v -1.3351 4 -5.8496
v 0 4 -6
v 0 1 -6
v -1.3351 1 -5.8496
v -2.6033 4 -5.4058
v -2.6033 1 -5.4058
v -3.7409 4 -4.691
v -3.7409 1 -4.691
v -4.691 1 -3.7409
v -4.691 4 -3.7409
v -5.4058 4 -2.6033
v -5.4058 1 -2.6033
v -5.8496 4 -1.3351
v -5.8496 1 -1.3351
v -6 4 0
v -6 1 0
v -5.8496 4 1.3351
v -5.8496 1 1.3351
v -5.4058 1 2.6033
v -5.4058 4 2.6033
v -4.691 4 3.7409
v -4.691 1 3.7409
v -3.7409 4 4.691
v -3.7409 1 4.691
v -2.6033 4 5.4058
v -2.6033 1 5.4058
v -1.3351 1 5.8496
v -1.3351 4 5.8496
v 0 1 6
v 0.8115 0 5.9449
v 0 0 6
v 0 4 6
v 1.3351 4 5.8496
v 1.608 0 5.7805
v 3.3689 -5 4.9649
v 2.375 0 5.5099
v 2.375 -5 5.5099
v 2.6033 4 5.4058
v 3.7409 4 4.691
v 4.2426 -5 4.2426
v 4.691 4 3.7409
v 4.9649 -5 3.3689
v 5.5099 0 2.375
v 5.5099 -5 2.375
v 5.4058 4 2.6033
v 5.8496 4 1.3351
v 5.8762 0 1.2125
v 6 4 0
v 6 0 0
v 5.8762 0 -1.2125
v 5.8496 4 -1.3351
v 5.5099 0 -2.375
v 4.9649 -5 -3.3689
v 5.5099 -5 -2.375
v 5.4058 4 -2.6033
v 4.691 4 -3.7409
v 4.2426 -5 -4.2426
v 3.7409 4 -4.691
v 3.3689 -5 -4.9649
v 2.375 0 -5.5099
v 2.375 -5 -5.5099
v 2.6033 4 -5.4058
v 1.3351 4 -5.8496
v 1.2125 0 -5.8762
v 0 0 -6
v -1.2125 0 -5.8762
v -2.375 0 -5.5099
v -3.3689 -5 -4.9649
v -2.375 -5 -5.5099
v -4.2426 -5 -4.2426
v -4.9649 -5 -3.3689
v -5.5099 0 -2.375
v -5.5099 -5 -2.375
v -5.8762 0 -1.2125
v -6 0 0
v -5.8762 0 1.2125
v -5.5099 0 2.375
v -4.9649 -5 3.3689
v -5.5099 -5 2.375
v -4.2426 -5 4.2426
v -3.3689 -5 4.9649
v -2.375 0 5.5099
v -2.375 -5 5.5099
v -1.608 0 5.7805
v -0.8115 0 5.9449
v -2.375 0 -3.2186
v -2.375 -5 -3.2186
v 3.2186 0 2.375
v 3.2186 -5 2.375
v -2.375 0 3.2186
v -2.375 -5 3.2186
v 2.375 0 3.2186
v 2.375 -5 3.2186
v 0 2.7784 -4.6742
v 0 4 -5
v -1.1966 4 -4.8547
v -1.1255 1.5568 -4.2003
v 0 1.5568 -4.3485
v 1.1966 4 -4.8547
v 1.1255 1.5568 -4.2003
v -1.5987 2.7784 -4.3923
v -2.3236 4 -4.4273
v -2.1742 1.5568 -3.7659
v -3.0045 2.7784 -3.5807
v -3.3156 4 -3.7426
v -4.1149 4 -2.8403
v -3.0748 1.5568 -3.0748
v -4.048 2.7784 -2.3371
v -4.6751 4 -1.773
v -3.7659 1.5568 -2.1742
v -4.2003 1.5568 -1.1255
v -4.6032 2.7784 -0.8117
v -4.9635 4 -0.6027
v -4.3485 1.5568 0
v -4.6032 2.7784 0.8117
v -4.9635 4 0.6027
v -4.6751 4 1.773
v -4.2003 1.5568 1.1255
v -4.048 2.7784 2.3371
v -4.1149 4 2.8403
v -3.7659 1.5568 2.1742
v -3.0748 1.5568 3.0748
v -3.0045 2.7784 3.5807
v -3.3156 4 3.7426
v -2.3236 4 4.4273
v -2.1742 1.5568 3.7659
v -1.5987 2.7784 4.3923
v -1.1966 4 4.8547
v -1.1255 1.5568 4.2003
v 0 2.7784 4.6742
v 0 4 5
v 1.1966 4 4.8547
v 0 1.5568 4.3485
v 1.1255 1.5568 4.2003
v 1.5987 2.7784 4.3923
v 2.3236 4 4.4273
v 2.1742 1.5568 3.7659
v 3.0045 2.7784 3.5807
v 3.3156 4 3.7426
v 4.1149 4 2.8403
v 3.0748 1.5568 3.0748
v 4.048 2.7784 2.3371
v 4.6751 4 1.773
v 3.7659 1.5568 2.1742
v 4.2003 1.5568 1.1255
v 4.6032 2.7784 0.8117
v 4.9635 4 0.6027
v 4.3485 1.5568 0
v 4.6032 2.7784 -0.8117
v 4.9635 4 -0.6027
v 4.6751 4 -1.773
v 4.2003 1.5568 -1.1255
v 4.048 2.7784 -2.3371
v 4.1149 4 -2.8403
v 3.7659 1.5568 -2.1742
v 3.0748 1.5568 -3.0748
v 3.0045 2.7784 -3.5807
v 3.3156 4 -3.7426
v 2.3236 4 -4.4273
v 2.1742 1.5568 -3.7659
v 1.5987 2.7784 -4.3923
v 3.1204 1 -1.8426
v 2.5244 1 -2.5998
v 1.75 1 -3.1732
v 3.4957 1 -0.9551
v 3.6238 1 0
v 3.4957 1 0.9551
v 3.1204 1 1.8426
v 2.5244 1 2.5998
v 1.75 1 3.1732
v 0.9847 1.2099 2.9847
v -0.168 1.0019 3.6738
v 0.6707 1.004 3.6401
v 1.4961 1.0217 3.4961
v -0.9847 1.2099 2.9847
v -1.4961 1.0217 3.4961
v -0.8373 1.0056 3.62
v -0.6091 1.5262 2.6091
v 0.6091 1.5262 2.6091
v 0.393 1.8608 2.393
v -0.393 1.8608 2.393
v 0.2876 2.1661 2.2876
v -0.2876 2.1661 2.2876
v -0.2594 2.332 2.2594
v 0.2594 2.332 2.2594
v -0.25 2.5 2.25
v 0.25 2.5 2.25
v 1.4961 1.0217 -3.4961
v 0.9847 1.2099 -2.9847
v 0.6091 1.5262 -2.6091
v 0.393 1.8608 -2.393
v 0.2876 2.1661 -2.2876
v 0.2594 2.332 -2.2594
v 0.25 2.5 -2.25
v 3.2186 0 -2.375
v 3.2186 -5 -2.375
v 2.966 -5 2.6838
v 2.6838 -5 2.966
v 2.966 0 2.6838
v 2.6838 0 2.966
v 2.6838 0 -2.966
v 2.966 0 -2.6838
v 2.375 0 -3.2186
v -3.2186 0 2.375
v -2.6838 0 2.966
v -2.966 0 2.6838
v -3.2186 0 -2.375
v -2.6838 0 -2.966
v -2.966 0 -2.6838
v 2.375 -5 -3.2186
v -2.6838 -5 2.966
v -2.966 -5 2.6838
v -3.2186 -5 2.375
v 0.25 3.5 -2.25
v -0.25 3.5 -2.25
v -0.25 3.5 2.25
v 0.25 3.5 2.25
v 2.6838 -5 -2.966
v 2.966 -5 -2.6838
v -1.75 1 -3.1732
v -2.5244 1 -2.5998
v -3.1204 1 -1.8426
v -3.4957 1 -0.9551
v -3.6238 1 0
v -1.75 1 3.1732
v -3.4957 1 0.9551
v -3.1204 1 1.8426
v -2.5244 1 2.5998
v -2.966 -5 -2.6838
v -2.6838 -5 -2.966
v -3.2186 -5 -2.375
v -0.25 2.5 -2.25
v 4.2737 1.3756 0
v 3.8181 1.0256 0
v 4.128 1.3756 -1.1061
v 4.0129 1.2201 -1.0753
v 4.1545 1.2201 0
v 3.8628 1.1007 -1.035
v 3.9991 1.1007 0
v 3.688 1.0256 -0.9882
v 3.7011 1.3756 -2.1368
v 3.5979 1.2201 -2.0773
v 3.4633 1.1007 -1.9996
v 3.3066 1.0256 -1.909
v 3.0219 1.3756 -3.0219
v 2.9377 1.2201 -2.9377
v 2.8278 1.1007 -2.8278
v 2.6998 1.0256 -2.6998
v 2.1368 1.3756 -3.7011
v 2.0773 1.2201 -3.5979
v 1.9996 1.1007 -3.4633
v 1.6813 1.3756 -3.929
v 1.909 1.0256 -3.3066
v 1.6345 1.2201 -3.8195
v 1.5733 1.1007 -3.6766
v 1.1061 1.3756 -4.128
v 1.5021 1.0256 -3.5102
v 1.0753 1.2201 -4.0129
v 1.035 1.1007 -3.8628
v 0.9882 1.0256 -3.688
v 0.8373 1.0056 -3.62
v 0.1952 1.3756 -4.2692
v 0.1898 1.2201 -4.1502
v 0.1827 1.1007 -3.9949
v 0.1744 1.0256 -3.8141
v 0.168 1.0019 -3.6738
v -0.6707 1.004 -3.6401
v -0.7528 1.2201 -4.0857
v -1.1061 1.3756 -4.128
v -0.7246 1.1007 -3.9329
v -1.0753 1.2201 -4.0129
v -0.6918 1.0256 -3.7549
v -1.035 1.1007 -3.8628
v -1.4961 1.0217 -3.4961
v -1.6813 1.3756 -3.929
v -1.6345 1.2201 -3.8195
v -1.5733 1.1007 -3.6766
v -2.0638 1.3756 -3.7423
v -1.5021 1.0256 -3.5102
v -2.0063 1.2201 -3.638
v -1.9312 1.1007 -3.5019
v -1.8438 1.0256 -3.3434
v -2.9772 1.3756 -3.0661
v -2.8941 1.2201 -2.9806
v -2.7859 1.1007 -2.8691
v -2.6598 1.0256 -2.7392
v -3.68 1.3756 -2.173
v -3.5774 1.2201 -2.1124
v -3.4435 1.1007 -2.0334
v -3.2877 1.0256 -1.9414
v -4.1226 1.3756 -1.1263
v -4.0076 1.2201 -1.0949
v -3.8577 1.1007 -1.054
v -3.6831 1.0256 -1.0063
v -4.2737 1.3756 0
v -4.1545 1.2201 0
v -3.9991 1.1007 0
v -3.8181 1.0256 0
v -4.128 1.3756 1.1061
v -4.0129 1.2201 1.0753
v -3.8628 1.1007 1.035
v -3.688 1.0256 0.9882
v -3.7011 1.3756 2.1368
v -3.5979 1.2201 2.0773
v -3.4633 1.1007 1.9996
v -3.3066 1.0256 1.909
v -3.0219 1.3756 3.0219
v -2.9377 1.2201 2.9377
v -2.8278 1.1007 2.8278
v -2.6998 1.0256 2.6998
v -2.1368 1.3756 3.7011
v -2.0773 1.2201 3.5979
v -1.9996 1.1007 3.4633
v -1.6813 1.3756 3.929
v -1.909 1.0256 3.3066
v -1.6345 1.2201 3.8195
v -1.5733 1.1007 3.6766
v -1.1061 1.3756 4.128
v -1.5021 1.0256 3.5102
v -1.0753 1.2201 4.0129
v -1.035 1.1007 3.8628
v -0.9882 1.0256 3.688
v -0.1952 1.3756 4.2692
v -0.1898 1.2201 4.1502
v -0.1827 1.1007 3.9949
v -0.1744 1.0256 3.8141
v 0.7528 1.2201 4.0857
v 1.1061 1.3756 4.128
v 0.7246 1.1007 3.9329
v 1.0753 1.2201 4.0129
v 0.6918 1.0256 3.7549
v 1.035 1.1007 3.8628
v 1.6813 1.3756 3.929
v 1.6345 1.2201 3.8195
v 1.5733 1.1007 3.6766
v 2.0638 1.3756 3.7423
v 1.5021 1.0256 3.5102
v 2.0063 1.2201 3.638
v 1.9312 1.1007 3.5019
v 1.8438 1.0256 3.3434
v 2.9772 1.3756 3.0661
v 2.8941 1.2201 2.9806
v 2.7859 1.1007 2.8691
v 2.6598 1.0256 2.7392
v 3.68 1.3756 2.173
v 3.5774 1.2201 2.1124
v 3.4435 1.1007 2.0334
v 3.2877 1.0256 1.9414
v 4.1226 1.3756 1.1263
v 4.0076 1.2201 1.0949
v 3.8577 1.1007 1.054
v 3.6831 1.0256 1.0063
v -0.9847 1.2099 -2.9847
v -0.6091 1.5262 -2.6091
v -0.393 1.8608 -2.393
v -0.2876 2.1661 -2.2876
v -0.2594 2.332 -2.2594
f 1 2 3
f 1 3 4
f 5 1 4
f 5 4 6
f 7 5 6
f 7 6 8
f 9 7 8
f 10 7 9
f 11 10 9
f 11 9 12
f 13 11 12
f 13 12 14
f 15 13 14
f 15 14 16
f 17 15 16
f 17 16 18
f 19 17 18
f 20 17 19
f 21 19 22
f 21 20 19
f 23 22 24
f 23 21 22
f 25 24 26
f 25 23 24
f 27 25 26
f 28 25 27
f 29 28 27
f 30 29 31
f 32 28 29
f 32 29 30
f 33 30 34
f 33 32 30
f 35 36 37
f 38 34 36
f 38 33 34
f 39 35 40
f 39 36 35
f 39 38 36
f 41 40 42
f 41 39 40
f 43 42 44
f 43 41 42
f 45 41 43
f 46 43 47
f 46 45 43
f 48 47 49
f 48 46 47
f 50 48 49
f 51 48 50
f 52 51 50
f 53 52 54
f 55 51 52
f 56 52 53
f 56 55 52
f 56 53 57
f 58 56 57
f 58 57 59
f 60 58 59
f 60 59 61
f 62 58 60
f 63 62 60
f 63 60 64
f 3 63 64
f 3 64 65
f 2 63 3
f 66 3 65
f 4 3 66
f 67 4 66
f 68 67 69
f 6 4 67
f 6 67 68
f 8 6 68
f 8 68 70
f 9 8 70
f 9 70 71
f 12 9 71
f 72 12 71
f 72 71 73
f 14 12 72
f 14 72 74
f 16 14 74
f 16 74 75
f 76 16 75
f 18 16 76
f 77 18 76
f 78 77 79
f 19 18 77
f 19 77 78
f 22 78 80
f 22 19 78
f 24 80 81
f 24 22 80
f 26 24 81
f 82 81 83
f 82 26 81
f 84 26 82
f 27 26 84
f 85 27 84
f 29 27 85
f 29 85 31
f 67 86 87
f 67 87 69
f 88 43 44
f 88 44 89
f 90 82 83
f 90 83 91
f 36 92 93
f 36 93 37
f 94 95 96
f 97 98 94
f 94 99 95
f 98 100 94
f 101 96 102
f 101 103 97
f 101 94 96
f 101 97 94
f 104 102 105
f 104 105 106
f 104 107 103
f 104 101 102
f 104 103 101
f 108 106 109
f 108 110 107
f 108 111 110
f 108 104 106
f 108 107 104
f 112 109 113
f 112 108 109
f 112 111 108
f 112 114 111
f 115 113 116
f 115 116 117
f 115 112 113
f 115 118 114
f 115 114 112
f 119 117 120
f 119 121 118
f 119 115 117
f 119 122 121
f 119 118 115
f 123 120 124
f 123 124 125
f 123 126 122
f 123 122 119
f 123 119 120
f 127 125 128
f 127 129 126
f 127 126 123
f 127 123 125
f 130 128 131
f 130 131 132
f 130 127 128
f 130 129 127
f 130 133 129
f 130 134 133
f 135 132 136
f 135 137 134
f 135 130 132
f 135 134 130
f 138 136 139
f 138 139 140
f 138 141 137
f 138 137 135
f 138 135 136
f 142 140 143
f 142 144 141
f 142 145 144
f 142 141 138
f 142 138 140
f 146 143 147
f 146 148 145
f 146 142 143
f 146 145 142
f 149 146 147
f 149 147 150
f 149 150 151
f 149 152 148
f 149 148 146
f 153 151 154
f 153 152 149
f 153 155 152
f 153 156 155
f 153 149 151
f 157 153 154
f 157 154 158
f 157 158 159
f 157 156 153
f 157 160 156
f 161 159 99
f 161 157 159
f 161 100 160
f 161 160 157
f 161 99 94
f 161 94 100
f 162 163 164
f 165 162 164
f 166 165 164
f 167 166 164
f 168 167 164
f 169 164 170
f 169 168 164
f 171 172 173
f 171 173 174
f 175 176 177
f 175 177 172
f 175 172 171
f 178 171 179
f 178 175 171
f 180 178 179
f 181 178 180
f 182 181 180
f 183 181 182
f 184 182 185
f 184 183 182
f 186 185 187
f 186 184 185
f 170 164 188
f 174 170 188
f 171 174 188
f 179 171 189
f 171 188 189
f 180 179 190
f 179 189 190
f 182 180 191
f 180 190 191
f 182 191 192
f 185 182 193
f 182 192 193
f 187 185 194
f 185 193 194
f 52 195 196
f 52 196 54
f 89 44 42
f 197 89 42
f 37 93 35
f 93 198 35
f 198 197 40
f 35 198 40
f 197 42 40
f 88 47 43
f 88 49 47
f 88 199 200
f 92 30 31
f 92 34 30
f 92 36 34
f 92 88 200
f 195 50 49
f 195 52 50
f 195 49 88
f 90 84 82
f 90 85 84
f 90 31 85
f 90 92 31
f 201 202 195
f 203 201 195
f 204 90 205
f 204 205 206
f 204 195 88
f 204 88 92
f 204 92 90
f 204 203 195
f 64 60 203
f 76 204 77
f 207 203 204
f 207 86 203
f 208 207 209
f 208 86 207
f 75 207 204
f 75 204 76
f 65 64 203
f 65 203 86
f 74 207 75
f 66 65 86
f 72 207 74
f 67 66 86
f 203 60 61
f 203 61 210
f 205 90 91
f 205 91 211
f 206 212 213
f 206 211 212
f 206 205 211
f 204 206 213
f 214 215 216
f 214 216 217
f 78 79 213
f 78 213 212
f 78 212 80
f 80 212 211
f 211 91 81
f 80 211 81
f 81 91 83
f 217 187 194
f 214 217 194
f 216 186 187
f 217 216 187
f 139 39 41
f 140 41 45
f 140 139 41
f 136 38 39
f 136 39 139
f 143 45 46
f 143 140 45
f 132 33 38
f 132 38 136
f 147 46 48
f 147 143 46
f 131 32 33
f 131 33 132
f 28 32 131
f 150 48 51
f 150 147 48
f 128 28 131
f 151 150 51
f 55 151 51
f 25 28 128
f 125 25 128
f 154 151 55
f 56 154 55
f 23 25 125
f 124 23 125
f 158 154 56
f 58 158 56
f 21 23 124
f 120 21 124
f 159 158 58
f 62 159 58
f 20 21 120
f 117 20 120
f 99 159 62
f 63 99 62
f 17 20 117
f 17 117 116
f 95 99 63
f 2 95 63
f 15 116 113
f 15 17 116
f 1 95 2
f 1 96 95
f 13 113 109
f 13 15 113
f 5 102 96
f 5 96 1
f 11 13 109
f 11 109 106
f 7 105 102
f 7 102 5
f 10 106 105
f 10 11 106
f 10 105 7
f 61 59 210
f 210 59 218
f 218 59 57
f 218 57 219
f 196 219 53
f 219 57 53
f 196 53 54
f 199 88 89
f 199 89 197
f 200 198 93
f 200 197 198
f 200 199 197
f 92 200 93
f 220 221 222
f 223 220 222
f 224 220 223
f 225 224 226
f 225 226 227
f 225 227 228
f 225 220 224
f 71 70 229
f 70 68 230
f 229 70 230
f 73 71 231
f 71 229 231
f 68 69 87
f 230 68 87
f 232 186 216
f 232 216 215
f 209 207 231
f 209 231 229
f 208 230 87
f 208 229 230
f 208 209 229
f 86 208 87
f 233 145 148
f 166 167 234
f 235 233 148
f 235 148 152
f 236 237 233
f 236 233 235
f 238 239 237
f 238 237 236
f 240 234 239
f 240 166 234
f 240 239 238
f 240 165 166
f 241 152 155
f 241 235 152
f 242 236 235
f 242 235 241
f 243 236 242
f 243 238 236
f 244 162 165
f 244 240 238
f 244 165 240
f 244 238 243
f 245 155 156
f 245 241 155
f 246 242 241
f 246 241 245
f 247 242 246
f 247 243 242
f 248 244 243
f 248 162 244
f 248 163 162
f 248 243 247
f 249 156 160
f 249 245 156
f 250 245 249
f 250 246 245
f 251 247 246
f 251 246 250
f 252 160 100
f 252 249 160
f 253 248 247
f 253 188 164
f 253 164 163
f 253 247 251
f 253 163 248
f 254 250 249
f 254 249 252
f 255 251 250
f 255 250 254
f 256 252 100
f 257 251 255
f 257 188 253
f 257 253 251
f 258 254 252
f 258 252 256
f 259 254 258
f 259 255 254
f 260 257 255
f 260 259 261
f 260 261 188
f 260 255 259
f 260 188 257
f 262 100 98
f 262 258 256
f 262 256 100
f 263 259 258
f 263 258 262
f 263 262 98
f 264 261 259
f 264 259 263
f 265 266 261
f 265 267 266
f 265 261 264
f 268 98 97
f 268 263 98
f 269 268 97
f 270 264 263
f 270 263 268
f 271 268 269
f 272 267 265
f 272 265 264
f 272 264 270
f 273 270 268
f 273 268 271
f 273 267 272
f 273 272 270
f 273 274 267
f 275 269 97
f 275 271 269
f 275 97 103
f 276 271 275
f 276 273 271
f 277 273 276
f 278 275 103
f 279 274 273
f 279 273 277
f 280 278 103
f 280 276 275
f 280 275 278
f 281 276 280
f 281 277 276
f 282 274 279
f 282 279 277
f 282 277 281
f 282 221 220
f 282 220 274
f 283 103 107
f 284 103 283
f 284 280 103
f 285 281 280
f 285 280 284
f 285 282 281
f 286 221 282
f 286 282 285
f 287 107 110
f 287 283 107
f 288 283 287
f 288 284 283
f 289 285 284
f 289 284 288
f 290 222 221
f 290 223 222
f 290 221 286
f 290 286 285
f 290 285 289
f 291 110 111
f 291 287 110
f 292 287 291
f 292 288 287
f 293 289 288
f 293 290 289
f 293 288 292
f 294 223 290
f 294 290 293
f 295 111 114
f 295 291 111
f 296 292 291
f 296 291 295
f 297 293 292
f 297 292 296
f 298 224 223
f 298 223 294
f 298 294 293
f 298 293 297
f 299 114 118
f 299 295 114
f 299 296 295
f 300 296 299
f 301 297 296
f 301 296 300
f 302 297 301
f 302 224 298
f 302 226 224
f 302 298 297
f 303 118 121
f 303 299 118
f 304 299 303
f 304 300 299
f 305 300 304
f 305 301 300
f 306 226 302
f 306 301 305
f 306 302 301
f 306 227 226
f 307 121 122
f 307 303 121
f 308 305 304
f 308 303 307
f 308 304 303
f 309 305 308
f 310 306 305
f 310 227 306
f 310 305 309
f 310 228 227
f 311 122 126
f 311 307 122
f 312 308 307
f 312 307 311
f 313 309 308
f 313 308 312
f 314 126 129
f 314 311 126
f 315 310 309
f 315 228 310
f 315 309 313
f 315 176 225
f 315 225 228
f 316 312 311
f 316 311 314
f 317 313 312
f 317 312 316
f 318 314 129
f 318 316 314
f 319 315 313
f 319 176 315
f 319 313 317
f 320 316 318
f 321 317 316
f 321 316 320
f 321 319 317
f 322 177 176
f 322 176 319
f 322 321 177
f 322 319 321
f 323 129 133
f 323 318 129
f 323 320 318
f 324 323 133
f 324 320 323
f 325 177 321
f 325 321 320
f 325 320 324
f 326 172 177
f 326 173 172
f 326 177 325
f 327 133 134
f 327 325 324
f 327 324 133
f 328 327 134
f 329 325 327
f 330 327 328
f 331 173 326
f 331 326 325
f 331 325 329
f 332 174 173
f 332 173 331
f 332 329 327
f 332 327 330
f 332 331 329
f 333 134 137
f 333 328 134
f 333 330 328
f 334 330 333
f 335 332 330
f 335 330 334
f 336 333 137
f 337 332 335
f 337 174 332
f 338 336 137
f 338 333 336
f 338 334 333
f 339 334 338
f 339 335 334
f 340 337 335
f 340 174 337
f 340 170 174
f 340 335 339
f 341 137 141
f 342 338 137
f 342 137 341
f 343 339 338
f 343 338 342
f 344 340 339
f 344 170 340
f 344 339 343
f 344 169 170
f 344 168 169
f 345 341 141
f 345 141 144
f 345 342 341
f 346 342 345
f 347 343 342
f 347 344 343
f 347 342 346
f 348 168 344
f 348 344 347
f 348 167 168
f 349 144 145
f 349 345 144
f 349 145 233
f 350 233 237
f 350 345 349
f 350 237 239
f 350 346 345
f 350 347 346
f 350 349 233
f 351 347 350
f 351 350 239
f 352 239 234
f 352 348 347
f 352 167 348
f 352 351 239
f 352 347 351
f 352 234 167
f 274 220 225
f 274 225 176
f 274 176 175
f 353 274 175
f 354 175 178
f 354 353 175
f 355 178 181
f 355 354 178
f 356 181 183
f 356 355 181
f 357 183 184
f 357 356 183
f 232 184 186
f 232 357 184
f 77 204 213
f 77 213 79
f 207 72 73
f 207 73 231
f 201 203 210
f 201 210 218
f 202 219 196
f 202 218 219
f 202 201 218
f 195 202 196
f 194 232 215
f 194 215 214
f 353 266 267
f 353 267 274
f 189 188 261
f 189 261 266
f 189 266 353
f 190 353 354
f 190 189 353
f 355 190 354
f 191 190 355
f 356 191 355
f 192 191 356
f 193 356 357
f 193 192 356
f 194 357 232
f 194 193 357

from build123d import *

# Parameters (mm, degrees)
BOSS_EXTRUDE1_DEPTH = 15
SKETCH2_R           = 6
BOSS_EXTRUDE2_DEPTH = 5
SKETCH2_2_R         = 6
BOSS_EXTRUDE3_DEPTH = 1
BOSS_EXTRUDE4_START = 1
SKETCH3_W           = 0.5
SKETCH3_H           = 4.5
BOSS_EXTRUDE4_DEPTH = 2.5
FILLET1_R           = 1.5
FILLET2_R           = 1.5


with BuildPart() as part:
    # Sketch1 → Boss-Extrude1 (new body)
    with BuildSketch(Plane(origin=(0, 0, 0), x_dir=(1, 0, 0), z_dir=(0, 1, 0))):
        with BuildLine():
            Line((-2.375, 10), (2.375, 10))
            Line((2.375, 10), (2.375, 3.218598297))
            ThreePointArc((2.375, 3.218598297), (2.828427125, 2.828427125), (3.218598297, 2.375))
            Line((3.218598297, 2.375), (10, 2.375))
            Line((10, 2.375), (10, -2.375))
            Line((10, -2.375), (3.218598297, -2.375))
            ThreePointArc((3.218598297, -2.375), (2.828427125, -2.828427125), (2.375, -3.218598297))
            Line((2.375, -3.218598297), (2.375, -10))
            Line((2.375, -10), (-2.375, -10))
            Line((-2.375, -10), (-2.375, -3.218598297))
            ThreePointArc((-2.375, -3.218598297), (-2.828427125, -2.828427125), (-3.218598297, -2.375))
            Line((-3.218598297, -2.375), (-10, -2.375))
            Line((-10, -2.375), (-10, 2.375))
            Line((-10, 2.375), (-3.218598297, 2.375))
            ThreePointArc((-3.218598297, 2.375), (-2.828427125, 2.828427125), (-2.375, 3.218598297))
            Line((-2.375, 3.218598297), (-2.375, 10))
        make_face()
    extrude(amount=-BOSS_EXTRUDE1_DEPTH)


with BuildPart() as body_2:
    # Sketch2 → Boss-Extrude2 (new body)
    with BuildSketch(Plane(origin=(0, 0, 0), x_dir=(1, 0, 0), z_dir=(0, 1, 0))):
        with Locations(Location((0, 0, 0), (0, 0, 270))):
            Circle(SKETCH2_R)
    extrude(amount=-BOSS_EXTRUDE2_DEPTH)

    # Sketch2<2> → Boss-Extrude3 (add)
    with BuildSketch(Plane(origin=(0, 0, 0), x_dir=(1, 0, 0), z_dir=(0, 1, 0))):
        with Locations(Location((0, 0, 0), (0, 0, 270))):
            Circle(SKETCH2_2_R)
    extrude(amount=BOSS_EXTRUDE3_DEPTH)

    # Combine1: cut part
    add(part.part, mode=Mode.SUBTRACT)

    # Sketch3 → Boss-Extrude4 (add)
    with BuildSketch(Plane(origin=(0, 0, 0), x_dir=(1, 0, 0), z_dir=(0, 1, 0)).offset(BOSS_EXTRUDE4_START)):
        Rectangle(SKETCH3_W, SKETCH3_H)
    extrude(amount=BOSS_EXTRUDE4_DEPTH)

    # Fillet1
    fillet1_edges = [body_2.edges().sort_by_distance(p)[0] for p in [
        (0.25, 1, 0),
        (-0.25, 1, 0),
    ]]
    fillet(fillet1_edges, radius=FILLET1_R)

    # Fillet2
    fillet2_edges = [body_2.edges().sort_by_distance(p)[0] for p in [
        (0, 1, -2.25),
        (0, 1, 2.25),
    ]]
    fillet(fillet2_edges, radius=FILLET2_R)

    # Sketch4 → Revolve1 (revolve)
    with BuildSketch(Plane(origin=(0, 0, 0), x_dir=(0, 0, -1), z_dir=(1, 0, 0)), mode=Mode.PRIVATE) as revolve1_sk:
        Polygon((-6, 1), (-6, 4), (-5, 4), (-4.2, 1), align=None)
    revolve(revolve1_sk.sketch.rotate(Axis((0, 0, 0), (0, 1, 0)), 180), axis=Axis((0, 0, 0), (0, 1, 0)))

    # Fillet3: read off the stored shape, not the designer's step
    # Fillet3 outline → Fillet3 (revolve)
    with BuildSketch(Plane.XY):
        with BuildLine():
            ThreePointArc((4.34846747, 1.556753012), (4.08071837, 1.155258358), (3.623791265, 1))
            Line((3.623791265, 1), (4.34846747, 1))
            Line((4.34846747, 1), (4.34846747, 1.556753012))
        make_face()
    revolve(axis=Axis((0, 0, 0), (0, 1, 0)))


solid = body_2.part
